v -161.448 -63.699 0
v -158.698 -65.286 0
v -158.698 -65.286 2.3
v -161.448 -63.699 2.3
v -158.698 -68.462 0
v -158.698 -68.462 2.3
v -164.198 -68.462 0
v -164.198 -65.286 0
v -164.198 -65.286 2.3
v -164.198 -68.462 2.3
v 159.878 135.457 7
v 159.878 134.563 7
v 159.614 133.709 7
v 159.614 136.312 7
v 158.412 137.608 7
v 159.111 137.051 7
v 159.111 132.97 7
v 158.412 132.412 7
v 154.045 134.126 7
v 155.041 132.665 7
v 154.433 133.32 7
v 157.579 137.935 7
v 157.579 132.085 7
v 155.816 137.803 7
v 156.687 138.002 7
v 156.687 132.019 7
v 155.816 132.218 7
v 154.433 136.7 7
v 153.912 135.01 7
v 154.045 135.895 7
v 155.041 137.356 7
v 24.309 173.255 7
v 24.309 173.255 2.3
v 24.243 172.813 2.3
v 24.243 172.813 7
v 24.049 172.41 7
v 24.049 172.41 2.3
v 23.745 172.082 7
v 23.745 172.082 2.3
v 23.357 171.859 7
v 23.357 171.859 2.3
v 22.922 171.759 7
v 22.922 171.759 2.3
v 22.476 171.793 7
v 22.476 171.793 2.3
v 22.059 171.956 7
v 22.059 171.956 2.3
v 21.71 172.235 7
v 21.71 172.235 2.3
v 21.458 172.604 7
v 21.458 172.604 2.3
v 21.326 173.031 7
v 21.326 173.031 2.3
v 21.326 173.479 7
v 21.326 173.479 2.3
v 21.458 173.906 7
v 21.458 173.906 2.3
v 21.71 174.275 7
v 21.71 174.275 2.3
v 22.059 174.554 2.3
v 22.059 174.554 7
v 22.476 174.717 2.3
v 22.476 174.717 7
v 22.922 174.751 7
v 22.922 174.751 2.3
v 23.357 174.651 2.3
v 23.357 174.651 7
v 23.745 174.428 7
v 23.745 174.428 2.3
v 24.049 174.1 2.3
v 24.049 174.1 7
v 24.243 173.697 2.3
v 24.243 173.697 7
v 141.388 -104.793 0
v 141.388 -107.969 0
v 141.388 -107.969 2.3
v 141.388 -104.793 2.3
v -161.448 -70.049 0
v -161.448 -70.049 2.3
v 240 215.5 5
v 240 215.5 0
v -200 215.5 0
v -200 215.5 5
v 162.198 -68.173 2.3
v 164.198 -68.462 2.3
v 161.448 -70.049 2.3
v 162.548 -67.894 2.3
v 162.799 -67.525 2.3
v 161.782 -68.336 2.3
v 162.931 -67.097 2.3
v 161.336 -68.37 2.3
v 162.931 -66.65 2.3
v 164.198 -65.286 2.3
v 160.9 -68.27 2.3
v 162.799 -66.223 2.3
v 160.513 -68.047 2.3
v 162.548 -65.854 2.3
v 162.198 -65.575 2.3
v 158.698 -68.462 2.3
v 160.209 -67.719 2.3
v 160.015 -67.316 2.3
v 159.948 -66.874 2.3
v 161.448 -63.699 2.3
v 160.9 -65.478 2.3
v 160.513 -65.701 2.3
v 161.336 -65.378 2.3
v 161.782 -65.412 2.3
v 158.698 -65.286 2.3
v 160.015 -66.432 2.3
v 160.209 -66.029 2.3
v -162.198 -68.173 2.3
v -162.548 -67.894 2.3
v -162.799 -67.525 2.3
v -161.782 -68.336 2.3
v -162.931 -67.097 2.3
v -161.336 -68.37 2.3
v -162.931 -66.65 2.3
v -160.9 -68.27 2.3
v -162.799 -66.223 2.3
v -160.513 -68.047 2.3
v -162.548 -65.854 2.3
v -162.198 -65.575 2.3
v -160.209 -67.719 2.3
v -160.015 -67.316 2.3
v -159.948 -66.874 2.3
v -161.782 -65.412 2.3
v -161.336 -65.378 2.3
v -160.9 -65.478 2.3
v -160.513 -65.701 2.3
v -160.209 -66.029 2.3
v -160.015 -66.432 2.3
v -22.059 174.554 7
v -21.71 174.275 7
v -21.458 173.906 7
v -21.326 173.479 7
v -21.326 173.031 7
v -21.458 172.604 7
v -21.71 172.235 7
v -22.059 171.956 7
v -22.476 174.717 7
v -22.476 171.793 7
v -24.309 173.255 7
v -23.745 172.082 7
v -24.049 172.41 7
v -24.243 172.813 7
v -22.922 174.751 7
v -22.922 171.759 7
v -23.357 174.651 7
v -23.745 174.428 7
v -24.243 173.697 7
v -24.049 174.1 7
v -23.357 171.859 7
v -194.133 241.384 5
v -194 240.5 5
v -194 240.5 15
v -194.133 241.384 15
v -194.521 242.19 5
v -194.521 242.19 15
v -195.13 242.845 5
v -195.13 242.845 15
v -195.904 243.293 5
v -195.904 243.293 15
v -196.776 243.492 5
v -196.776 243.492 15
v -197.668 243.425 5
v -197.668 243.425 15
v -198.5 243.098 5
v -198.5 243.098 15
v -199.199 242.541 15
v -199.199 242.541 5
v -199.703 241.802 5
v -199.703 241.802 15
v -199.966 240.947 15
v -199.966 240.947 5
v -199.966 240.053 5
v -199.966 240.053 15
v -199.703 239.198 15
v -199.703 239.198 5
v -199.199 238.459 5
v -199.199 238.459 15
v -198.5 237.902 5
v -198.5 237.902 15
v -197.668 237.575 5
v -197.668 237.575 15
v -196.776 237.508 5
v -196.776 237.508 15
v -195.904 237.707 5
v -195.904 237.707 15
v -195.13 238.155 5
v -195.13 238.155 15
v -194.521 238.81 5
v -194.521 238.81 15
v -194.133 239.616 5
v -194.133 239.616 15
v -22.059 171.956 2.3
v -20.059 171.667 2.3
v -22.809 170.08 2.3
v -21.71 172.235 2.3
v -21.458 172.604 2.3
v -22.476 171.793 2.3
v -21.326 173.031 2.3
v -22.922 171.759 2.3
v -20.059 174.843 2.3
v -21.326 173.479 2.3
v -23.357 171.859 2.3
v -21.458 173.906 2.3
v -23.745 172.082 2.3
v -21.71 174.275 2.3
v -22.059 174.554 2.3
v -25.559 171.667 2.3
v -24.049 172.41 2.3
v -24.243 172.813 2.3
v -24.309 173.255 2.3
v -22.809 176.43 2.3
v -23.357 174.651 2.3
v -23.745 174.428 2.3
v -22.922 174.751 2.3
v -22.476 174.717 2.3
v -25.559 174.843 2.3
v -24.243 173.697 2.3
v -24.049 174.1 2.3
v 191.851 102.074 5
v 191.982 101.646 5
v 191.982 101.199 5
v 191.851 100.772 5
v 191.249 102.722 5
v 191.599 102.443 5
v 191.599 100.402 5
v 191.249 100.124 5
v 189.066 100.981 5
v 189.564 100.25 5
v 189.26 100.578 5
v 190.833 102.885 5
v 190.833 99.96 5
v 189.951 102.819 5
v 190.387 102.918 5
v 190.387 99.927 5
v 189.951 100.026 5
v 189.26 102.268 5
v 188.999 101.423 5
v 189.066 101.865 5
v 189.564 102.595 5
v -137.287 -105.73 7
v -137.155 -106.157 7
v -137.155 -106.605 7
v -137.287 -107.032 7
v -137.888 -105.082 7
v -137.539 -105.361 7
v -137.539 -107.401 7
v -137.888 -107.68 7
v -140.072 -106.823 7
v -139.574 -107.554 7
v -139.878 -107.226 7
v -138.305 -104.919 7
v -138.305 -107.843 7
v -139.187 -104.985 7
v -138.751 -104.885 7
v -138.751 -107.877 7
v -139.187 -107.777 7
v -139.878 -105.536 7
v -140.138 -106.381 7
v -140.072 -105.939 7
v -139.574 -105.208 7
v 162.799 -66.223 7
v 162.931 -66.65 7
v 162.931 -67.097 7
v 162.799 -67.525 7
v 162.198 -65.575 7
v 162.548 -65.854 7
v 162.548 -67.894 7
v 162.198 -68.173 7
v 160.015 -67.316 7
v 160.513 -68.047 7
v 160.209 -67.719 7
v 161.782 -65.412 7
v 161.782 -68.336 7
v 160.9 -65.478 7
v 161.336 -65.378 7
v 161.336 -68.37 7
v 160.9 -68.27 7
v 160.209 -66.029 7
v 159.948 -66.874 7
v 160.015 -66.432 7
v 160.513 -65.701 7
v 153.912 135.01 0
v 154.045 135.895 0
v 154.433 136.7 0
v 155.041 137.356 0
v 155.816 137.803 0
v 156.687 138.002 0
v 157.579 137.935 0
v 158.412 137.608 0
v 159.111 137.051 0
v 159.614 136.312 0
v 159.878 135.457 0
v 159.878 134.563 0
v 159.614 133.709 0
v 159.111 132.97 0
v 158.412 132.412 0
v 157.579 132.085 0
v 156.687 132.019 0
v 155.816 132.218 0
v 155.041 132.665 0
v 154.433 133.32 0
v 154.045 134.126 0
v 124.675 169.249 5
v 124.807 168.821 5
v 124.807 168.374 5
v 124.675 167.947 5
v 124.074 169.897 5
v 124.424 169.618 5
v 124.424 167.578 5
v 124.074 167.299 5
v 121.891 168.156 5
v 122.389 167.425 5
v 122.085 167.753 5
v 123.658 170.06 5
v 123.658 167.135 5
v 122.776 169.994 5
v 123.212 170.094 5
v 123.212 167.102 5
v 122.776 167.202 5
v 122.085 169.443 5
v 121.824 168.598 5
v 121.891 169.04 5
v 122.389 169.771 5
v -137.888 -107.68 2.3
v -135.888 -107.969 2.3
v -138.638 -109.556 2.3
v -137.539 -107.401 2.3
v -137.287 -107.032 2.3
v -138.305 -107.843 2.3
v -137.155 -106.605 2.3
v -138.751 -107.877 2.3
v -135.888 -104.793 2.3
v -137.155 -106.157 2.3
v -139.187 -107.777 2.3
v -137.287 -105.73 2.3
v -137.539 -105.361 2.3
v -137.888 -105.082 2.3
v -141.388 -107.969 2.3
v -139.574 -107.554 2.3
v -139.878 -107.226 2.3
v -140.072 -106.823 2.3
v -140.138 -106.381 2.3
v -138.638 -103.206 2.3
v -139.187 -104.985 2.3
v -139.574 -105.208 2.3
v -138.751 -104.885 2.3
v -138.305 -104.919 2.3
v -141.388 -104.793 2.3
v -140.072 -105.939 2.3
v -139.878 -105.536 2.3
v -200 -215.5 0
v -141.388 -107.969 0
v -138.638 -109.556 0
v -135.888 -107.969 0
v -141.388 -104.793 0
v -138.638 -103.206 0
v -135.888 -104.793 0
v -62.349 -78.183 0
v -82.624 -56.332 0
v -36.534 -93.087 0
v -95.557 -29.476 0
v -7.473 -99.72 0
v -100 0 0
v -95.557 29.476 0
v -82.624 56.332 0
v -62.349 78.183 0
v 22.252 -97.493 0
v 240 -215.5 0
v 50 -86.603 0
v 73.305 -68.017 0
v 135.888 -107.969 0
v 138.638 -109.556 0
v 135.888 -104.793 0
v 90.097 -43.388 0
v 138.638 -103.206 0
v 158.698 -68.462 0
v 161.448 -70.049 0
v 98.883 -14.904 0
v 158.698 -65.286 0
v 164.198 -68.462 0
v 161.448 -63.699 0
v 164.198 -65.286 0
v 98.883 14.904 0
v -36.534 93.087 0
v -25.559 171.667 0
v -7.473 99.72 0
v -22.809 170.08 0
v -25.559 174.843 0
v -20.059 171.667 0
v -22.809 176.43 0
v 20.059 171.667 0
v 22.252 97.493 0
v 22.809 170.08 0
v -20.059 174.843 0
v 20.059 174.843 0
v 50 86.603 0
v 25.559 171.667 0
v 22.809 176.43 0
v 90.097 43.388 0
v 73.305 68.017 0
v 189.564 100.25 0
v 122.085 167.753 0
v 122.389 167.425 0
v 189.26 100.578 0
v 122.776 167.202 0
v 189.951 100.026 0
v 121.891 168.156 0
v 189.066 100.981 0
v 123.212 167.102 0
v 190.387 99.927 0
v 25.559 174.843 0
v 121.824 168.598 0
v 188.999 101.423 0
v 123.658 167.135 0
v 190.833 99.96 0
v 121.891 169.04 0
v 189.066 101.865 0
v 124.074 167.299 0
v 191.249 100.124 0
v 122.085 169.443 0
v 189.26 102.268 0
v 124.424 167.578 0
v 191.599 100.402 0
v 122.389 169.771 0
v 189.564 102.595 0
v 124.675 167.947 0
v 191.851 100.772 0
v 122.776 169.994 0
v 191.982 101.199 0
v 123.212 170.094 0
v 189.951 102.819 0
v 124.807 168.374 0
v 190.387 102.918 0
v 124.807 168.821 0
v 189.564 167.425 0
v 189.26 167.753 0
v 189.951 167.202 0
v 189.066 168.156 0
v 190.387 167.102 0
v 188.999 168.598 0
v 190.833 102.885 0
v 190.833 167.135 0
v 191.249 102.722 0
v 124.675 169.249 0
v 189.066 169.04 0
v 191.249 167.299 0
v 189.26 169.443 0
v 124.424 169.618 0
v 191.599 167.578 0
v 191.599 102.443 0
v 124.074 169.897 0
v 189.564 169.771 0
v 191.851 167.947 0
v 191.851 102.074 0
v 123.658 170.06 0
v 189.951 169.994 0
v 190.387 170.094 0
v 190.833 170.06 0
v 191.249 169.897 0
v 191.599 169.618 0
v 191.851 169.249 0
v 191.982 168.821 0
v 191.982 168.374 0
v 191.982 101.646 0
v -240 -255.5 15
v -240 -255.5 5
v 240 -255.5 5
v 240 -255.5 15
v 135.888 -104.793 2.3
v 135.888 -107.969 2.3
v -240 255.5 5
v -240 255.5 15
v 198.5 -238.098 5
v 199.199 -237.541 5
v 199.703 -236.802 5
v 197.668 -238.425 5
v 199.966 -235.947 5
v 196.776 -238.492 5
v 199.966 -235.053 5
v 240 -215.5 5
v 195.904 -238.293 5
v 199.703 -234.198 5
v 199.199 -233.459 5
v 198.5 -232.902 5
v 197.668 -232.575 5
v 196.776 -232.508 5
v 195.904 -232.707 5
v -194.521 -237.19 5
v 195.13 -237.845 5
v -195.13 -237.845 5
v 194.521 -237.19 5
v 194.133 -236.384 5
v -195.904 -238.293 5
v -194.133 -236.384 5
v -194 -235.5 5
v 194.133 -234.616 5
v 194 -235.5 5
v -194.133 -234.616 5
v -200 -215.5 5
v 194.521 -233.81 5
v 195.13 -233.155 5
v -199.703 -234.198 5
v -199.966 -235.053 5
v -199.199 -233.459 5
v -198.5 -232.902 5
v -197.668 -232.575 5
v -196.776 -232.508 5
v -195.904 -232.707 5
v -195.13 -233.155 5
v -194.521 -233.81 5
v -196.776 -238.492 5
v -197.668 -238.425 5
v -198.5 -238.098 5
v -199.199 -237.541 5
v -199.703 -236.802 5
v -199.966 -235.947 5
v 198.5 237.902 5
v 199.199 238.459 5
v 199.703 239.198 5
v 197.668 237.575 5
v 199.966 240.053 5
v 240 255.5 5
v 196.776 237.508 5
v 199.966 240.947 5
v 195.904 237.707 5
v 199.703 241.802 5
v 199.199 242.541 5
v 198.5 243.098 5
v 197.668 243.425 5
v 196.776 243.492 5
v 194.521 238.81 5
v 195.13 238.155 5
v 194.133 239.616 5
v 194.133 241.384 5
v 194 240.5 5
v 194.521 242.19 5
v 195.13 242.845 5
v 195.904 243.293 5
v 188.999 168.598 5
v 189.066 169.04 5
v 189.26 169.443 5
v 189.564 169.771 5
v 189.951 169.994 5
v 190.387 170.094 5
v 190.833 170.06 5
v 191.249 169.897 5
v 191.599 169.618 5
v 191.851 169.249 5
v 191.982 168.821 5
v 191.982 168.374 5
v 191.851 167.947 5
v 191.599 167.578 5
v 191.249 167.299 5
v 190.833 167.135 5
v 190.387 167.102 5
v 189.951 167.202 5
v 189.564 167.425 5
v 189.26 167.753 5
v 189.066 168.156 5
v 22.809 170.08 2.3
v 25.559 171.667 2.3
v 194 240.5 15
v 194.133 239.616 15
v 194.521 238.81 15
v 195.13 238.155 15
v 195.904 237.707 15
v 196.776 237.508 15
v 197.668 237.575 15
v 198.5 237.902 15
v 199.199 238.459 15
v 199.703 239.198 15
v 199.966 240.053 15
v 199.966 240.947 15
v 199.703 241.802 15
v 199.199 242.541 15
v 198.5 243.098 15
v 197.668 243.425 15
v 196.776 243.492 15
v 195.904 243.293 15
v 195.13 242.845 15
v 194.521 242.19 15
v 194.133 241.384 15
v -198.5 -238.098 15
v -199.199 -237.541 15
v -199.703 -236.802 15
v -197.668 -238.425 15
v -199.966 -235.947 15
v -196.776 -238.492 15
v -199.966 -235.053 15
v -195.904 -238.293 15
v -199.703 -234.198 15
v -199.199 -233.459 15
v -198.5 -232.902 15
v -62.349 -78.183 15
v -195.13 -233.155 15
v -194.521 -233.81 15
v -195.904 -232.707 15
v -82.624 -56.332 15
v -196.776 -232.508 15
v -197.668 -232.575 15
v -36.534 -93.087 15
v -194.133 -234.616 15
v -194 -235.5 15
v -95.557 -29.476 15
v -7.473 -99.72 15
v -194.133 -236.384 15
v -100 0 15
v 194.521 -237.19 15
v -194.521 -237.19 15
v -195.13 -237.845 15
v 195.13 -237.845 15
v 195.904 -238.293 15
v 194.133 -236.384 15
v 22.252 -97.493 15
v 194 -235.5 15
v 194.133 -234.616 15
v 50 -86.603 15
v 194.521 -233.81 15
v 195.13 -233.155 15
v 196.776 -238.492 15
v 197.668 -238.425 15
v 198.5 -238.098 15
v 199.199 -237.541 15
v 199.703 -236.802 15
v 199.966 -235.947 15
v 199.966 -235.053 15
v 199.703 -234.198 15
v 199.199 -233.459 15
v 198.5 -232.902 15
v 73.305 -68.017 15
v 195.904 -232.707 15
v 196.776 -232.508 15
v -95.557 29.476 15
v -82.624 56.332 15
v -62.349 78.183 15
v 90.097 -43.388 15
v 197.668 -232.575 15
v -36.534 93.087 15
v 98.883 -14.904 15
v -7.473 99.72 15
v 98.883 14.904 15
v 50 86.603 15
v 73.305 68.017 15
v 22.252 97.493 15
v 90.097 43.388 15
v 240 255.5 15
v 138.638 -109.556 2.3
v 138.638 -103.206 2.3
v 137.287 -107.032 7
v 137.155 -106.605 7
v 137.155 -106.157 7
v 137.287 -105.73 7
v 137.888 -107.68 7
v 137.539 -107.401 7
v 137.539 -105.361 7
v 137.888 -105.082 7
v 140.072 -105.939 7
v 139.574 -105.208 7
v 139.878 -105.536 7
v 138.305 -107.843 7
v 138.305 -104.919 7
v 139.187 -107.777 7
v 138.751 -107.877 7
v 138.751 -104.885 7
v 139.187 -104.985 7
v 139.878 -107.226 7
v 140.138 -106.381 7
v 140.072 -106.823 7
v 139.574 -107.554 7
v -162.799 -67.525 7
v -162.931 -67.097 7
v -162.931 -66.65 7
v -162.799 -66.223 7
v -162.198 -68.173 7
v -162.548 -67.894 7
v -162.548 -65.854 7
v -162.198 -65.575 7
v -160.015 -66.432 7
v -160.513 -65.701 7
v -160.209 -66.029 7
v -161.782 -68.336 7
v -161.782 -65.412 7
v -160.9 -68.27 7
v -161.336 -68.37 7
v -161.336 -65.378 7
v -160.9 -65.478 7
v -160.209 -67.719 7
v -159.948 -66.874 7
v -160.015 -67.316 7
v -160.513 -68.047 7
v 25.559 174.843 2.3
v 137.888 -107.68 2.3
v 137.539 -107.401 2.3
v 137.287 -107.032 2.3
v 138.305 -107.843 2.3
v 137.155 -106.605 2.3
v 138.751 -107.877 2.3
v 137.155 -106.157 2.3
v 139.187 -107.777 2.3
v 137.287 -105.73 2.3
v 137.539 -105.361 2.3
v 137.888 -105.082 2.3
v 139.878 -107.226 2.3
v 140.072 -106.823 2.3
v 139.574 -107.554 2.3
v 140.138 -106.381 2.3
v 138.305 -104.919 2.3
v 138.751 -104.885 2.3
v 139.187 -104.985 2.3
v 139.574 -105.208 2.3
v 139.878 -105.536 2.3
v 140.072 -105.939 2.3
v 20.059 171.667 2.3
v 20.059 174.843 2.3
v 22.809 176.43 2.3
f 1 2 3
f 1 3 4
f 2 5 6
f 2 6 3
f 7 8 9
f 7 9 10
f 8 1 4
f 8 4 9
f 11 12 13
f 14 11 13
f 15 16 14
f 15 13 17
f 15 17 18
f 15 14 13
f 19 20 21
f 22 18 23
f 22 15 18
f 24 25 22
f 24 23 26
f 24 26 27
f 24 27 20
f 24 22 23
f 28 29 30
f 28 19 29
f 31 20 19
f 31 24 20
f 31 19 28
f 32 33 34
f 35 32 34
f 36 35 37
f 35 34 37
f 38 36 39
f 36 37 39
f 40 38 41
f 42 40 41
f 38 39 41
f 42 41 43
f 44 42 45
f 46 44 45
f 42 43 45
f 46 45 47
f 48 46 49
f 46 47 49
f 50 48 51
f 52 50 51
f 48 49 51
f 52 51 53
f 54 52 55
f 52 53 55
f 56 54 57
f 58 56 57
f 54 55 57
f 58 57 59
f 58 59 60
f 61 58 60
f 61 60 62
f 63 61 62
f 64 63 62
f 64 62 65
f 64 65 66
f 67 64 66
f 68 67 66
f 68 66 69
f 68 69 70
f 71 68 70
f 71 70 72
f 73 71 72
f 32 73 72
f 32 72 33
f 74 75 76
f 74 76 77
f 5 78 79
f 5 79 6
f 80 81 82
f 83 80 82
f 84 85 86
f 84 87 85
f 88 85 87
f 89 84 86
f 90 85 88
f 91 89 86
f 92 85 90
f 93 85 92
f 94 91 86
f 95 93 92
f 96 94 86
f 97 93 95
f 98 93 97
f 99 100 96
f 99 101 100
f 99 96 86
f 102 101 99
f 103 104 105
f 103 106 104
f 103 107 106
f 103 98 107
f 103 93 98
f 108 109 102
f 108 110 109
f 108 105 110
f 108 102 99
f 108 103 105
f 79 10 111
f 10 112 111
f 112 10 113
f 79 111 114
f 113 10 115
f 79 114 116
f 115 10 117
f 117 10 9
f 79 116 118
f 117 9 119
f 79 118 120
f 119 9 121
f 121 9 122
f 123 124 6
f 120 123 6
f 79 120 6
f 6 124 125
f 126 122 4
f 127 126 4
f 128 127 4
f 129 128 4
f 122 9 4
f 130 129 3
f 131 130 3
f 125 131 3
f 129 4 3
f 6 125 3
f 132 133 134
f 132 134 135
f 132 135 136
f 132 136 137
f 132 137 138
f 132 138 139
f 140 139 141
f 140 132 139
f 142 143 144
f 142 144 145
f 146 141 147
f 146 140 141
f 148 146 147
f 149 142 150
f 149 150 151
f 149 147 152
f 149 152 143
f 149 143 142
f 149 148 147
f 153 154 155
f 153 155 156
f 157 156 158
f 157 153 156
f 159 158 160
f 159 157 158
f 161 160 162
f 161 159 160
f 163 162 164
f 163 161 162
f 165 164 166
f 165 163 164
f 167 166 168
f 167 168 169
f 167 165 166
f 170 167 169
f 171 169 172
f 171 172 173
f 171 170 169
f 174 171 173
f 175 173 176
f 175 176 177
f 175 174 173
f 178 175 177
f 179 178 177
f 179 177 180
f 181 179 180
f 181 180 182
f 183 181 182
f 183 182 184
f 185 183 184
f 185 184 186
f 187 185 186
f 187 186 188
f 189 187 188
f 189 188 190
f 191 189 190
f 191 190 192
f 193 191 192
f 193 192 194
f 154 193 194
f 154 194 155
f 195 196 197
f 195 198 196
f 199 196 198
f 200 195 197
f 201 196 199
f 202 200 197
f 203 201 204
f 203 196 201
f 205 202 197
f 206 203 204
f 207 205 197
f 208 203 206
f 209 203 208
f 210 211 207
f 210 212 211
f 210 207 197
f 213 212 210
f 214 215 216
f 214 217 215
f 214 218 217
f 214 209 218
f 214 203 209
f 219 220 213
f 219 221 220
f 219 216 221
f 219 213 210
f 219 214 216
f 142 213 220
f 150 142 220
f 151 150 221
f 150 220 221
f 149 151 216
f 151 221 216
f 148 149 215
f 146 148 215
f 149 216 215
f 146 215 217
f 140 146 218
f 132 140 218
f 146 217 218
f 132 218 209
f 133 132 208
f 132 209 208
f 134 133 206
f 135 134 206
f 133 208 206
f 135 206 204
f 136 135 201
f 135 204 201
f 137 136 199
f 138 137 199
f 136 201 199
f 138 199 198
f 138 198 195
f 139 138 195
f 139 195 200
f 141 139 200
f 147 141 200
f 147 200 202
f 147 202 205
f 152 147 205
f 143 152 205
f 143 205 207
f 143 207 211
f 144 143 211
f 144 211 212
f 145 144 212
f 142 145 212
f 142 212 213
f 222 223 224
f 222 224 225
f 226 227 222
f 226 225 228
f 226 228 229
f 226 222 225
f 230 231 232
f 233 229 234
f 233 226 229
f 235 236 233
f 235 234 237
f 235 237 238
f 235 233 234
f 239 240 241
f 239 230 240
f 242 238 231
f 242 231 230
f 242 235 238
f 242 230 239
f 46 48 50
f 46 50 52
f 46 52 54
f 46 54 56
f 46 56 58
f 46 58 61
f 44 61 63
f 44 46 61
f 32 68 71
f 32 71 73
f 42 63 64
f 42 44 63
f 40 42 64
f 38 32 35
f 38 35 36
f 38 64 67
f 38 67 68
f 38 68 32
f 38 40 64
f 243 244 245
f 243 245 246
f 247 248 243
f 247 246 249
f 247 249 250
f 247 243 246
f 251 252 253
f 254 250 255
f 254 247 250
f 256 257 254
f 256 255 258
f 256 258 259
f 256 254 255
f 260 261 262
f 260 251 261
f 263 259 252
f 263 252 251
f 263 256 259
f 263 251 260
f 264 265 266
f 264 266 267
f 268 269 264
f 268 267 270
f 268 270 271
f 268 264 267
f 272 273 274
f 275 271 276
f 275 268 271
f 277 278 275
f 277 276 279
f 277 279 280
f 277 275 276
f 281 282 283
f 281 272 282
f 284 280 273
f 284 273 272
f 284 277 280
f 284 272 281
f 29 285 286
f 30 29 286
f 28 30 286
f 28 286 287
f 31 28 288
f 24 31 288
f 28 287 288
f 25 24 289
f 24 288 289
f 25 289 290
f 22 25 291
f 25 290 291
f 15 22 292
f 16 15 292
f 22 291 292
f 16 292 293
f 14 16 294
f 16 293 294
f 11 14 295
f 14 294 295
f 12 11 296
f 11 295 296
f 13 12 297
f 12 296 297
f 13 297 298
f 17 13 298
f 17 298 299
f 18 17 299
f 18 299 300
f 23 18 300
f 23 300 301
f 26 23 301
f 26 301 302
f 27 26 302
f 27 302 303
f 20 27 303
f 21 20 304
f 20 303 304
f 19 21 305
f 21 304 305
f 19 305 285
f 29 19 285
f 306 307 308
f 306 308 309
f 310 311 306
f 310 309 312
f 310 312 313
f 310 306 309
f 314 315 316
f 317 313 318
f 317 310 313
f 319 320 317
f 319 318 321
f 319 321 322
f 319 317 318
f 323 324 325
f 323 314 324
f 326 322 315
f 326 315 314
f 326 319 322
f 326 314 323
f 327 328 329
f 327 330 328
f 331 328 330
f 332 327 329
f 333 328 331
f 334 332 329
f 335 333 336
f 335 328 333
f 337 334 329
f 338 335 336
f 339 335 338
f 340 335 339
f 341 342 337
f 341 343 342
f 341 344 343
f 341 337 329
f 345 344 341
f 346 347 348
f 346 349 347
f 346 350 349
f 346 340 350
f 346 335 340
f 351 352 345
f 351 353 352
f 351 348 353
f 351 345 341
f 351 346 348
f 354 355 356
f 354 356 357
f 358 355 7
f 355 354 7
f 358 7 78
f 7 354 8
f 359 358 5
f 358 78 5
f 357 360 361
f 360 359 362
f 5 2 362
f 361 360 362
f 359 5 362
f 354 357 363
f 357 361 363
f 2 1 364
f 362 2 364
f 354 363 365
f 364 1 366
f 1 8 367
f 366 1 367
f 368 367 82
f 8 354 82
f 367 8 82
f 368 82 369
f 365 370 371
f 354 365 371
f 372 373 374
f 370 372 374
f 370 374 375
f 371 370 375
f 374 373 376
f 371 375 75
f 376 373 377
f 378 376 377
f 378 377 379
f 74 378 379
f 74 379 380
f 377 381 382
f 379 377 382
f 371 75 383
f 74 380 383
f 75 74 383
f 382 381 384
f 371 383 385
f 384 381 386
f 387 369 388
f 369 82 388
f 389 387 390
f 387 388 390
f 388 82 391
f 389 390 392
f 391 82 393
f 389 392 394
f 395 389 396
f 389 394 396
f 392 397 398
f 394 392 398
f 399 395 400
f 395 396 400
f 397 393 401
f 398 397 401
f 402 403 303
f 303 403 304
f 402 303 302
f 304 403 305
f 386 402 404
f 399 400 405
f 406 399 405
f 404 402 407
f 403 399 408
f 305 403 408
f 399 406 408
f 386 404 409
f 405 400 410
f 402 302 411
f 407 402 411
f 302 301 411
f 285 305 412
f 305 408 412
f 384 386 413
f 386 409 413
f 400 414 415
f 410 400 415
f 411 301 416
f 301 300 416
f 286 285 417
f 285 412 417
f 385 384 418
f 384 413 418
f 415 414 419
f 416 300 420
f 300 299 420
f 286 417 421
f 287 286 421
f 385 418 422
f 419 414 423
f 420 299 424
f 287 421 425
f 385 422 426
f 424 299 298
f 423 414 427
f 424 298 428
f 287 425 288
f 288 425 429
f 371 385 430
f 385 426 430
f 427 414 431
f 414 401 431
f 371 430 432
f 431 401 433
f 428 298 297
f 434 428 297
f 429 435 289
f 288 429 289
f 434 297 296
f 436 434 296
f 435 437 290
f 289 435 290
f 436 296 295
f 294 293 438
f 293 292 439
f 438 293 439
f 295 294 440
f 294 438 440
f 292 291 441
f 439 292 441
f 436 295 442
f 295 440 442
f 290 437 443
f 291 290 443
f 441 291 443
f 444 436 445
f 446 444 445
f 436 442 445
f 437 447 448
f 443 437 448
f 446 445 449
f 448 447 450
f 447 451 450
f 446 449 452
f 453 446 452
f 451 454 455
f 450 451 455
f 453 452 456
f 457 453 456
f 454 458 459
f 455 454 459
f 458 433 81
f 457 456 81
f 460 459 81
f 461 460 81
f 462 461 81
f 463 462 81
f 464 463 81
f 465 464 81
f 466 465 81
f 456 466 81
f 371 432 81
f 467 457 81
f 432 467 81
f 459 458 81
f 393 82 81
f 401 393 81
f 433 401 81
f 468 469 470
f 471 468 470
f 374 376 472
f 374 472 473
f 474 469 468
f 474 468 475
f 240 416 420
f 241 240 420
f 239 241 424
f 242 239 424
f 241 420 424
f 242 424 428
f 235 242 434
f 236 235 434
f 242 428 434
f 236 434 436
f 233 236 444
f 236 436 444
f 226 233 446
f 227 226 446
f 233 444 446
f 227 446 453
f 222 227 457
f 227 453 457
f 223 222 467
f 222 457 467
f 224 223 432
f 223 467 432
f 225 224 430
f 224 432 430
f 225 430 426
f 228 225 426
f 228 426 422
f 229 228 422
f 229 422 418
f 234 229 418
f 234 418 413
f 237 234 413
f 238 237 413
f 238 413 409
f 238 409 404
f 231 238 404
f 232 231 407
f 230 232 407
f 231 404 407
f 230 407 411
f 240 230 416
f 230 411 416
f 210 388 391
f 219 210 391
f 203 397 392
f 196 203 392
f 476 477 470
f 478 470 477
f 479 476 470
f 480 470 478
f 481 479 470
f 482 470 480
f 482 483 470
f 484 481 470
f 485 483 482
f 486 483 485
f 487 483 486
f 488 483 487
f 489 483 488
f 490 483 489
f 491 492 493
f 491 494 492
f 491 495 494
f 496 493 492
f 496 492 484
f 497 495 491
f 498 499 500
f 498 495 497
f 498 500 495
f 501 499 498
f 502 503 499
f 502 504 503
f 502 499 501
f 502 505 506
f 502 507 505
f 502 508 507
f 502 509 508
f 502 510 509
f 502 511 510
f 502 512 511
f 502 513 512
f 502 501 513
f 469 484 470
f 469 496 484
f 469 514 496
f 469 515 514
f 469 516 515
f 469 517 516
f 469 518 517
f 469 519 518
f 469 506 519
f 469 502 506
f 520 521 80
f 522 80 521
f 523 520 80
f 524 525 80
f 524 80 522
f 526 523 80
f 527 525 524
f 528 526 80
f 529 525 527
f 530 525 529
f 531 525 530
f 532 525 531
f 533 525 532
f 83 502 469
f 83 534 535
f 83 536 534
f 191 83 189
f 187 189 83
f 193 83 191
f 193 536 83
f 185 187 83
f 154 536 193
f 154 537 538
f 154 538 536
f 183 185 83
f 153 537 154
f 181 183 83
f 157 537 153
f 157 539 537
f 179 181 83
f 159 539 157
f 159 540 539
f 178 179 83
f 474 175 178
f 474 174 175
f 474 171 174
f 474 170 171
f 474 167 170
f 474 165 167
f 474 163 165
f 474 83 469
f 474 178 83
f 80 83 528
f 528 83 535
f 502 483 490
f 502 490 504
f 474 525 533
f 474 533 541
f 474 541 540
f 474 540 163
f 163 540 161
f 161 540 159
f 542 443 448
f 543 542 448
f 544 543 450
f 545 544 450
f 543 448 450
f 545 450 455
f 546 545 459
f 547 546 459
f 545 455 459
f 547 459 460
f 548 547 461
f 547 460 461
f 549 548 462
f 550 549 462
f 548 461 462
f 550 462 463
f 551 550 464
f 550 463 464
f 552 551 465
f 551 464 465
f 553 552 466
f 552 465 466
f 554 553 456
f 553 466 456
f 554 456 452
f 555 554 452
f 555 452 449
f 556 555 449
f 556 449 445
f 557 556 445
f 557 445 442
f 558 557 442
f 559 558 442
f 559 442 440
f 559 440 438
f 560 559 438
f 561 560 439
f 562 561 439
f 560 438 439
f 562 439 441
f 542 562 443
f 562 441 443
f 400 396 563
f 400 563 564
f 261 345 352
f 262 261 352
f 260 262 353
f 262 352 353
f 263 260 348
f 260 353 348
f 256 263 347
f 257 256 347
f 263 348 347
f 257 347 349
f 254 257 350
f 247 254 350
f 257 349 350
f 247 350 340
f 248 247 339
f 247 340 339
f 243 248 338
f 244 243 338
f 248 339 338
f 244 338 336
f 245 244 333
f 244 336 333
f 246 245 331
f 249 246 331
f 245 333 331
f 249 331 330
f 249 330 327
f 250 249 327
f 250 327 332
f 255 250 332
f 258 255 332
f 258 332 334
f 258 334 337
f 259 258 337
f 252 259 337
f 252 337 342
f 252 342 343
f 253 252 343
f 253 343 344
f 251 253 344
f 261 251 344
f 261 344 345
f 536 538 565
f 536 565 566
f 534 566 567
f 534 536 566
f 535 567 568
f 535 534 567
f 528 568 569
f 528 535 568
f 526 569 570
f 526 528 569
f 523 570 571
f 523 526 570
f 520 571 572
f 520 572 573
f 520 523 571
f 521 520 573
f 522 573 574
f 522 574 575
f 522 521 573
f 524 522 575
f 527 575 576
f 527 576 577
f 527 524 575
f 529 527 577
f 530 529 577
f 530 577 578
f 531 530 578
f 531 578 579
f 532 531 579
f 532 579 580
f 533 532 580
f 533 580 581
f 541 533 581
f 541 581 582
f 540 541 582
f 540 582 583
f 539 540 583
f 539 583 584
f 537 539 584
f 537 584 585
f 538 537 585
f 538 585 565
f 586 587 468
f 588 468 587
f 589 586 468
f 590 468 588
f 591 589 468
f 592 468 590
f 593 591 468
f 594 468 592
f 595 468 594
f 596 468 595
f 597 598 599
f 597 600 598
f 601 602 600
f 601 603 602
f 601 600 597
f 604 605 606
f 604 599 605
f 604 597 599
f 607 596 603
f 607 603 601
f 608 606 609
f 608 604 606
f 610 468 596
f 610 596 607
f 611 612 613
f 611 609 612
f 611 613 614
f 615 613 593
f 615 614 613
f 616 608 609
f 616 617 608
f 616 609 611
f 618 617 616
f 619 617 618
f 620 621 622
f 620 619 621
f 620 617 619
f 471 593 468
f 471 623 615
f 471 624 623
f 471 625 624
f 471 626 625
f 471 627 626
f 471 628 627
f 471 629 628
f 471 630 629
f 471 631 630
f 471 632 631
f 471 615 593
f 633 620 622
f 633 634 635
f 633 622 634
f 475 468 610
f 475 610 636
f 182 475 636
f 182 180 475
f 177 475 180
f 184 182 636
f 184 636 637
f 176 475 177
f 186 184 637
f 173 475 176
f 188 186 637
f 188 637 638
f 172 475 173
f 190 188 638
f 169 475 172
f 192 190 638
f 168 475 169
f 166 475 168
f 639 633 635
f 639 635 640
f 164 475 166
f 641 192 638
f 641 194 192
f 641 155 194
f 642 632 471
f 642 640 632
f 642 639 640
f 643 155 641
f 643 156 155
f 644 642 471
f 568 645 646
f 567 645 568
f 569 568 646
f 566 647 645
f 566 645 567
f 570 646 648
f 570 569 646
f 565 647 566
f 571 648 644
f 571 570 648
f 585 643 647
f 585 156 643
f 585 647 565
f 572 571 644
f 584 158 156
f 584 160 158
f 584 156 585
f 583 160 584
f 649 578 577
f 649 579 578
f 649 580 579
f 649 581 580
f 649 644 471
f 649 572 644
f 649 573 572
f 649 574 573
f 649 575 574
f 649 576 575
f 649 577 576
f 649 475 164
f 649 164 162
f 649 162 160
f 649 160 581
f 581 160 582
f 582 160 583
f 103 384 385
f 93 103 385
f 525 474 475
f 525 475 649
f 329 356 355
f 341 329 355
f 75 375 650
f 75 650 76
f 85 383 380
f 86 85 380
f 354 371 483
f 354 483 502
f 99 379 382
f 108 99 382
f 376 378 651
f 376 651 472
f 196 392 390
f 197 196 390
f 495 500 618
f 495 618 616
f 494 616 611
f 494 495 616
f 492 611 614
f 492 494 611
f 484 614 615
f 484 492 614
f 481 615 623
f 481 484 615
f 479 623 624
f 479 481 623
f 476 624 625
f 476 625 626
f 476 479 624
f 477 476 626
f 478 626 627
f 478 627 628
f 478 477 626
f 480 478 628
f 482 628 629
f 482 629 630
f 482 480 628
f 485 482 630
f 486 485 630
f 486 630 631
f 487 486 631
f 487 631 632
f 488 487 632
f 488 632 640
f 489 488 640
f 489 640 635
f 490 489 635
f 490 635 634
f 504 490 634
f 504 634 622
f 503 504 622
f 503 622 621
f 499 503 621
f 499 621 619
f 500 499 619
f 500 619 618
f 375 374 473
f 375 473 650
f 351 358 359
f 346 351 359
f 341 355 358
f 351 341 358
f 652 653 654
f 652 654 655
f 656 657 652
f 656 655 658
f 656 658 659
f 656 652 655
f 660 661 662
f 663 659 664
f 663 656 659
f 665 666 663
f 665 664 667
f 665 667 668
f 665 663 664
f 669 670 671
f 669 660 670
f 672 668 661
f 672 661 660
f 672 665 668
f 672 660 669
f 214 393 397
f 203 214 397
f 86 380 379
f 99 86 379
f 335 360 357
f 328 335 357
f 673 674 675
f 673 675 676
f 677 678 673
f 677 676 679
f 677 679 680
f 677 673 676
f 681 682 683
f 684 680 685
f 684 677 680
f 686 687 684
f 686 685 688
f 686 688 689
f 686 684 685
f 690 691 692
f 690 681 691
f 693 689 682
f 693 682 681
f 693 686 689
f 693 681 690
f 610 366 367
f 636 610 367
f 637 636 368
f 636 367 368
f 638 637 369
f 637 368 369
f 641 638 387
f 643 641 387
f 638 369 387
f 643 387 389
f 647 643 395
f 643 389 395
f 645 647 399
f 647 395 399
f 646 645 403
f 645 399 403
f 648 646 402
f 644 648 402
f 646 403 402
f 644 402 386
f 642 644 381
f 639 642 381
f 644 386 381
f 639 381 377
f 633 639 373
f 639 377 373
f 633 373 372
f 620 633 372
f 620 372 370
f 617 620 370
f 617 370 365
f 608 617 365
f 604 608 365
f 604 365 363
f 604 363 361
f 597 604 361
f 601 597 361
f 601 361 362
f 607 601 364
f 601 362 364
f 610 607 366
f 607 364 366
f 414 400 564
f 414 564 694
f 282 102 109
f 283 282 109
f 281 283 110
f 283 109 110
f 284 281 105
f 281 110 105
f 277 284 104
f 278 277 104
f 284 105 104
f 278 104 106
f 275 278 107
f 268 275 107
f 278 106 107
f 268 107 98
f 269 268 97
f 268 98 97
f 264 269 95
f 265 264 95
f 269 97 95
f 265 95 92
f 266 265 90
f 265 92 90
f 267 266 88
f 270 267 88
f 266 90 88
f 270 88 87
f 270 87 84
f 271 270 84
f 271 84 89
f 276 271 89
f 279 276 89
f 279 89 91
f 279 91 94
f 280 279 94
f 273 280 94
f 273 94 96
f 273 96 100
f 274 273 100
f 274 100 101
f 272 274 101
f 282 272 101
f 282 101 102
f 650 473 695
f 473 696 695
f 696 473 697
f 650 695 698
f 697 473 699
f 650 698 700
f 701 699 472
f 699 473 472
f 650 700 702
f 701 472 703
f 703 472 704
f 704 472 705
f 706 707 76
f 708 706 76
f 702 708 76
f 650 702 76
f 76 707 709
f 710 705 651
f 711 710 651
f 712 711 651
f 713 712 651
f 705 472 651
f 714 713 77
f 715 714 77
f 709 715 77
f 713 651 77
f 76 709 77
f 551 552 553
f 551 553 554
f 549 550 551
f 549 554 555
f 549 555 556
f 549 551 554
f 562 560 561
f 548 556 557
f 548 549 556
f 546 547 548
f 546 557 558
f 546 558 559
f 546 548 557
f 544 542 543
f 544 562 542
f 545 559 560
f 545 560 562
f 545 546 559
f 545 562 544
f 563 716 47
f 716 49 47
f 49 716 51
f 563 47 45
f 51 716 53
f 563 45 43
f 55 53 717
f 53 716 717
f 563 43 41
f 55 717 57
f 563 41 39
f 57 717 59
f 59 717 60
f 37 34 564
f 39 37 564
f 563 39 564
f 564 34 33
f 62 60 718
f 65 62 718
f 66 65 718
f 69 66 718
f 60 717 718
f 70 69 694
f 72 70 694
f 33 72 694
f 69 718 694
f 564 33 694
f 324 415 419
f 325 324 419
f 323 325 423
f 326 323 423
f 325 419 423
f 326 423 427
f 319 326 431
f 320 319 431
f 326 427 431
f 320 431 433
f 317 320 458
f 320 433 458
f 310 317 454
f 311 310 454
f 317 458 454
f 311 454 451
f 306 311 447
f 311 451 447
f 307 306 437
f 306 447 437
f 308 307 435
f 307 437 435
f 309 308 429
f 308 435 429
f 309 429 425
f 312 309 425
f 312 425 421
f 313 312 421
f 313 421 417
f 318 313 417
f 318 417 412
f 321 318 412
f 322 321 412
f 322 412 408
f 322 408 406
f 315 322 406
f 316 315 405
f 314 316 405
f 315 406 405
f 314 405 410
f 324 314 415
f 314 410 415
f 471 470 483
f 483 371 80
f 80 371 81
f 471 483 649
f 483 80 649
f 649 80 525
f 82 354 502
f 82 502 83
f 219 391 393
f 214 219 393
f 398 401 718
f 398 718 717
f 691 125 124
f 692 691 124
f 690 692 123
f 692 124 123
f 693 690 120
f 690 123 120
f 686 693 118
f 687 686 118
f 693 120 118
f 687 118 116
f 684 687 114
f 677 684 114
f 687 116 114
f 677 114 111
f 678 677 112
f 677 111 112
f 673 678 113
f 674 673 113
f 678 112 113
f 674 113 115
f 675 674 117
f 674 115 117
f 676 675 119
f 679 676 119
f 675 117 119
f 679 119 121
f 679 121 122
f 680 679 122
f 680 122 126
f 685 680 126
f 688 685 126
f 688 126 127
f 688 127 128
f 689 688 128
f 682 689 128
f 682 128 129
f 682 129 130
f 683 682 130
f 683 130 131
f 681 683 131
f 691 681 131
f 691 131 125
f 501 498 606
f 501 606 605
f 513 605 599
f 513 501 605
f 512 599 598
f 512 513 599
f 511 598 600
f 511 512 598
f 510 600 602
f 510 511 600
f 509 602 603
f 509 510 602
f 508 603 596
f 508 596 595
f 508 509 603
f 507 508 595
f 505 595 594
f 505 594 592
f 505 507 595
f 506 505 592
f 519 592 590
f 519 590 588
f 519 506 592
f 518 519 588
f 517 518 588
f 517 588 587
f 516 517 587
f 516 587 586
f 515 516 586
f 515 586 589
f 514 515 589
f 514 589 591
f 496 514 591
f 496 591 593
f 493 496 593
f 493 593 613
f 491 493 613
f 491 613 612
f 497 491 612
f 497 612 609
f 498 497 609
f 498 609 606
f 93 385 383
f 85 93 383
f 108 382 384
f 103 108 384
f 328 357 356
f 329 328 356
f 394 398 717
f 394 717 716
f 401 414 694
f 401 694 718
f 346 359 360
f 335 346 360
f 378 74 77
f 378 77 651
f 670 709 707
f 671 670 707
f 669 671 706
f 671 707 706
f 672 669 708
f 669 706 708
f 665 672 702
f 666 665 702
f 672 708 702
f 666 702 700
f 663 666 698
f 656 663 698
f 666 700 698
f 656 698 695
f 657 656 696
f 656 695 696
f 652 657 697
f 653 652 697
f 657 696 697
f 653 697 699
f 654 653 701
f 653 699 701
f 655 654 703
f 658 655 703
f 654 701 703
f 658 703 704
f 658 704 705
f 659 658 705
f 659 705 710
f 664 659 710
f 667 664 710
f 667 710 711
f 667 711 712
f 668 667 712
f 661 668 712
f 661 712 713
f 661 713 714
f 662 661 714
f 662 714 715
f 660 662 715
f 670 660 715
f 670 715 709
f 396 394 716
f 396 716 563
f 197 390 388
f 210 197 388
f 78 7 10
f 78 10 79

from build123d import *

# Parameters (mm, degrees)
SKETCH1_W           = 480
SKETCH1_H           = 511
SKETCH1_R           = 3
BOSS_EXTRUDE1_DEPTH = 15
SKETCH2_W           = 40
SKETCH2_H           = 40
SKETCH2_H_2         = 431
SKETCH2_W_2         = 440
CUT_EXTRUDE1_DEPTH  = 5
SKETCH3_R           = 100
CUT_EXTRUDE2_DEPTH  = 15
SKETCH4_R           = 1.5
CUT_EXTRUDE3_DEPTH  = 7
CUT_EXTRUDE4_DEPTH  = 2.3
SKETCH6_R           = 3
CUT_EXTRUDE5_DEPTH  = 7
SKETCH7_R           = 1.5
CUT_EXTRUDE6_DEPTH  = 5


with BuildPart() as part:
    # Sketch1 → Boss-Extrude1 (new body)
    with BuildSketch(Plane.XY):
        Rectangle(SKETCH1_W, SKETCH1_H)
        with Locations((-197, 240.5)):
            Circle(SKETCH1_R, mode=Mode.SUBTRACT)
        with Locations((-197, -235.5)):
            Circle(SKETCH1_R, mode=Mode.SUBTRACT)
        with Locations(Location((197, -235.5, 0), (0, 0, 180))):
            Circle(SKETCH1_R, mode=Mode.SUBTRACT)
        with Locations(Location((197, 240.5, 0), (0, 0, 180))):
            Circle(SKETCH1_R, mode=Mode.SUBTRACT)
    extrude(amount=BOSS_EXTRUDE1_DEPTH)

    # Sketch2 → Cut-Extrude1 (cut)
    with BuildSketch(Plane(origin=(0, 0, 0), x_dir=(-1, 0, 0), z_dir=(0, 0, -1))):
        Polygon((-200, 255.5), (-240, 255.5), (-240, 215.5), (200, 215.5), (200, 255.5), align=None)
        with Locations((220, 235.5)):
            Rectangle(SKETCH2_W, SKETCH2_H)
        with Locations((220, 0)):
            Rectangle(SKETCH2_W, SKETCH2_H_2)
        with Locations((-20, -235.5)):
            Rectangle(SKETCH2_W_2, SKETCH2_H)
        with Locations((220, -235.5)):
            Rectangle(SKETCH2_W, SKETCH2_H)
    extrude(amount=-CUT_EXTRUDE1_DEPTH, mode=Mode.SUBTRACT)

    # Sketch3 → Cut-Extrude2 (cut)
    with BuildSketch(Plane(origin=(0, 0, 0), x_dir=(-1, 0, 0), z_dir=(0, 0, -1))):
        Circle(SKETCH3_R)
    extrude(amount=-CUT_EXTRUDE2_DEPTH, mode=Mode.SUBTRACT)

    # Sketch4 → Cut-Extrude3 (cut)
    with BuildSketch(Plane(origin=(0, 0, 0), x_dir=(-1, 0, 0), z_dir=(0, 0, -1))):
        with Locations((22.80945209, 173.254989525)):
            Circle(SKETCH4_R)
        with Locations(Location((-22.80945209, 173.254989525, 0), (0, 0, 180))):
            Circle(SKETCH4_R)
        with Locations((-161.447948306, -66.873929806)):
            Circle(SKETCH4_R)
        with Locations(Location((-138.638496216, -106.381059719, 0), (0, 0, 180))):
            Circle(SKETCH4_R)
        with Locations((138.638496216, -106.381059719)):
            Circle(SKETCH4_R)
        with Locations(Location((161.447948306, -66.873929806, 0), (0, 0, 180))):
            Circle(SKETCH4_R)
    extrude(amount=-CUT_EXTRUDE3_DEPTH, mode=Mode.SUBTRACT)

    # Sketch5 → Cut-Extrude4 (cut)
    with BuildSketch(Plane(origin=(0, 0, 0), x_dir=(-1, 0, 0), z_dir=(0, 0, -1))):
        Polygon((22.80945209, 176.430416006), (20.05945209, 174.842702765), (20.05945209, 171.667276285), (22.80945209, 170.079563045), (25.55945209, 171.667276285), (25.55945209, 174.842702765), align=None)
        Polygon((-20.05945209, 174.842702765), (-20.05945209, 171.667276285), (-22.80945209, 170.079563045), (-25.55945209, 171.667276285), (-25.55945209, 174.842702765), (-22.80945209, 176.430416006), align=None)
        Polygon((-164.197948306, -68.461643046), (-161.447948306, -70.049356286), (-158.697948306, -68.461643046), (-158.697948306, -65.286216566), (-161.447948306, -63.698503325), (-164.197948306, -65.286216566), align=None)
        Polygon((-138.638496216, -109.5564862), (-141.388496216, -107.96877296), (-141.388496216, -104.793346479), (-138.638496216, -103.205633239), (-135.888496216, -104.793346479), (-135.888496216, -107.96877296), align=None)
        Polygon((141.388496216, -107.96877296), (141.388496216, -104.793346479), (138.638496216, -103.205633239), (135.888496216, -104.793346479), (135.888496216, -107.96877296), (138.638496216, -109.5564862), align=None)
        Polygon((164.197948306, -65.286216566), (164.197948306, -68.461643046), (161.447948306, -70.049356286), (158.697948306, -68.461643046), (158.697948306, -65.286216566), (161.447948306, -63.698503325), align=None)
    extrude(amount=-CUT_EXTRUDE4_DEPTH, mode=Mode.SUBTRACT)

    # Sketch6 → Cut-Extrude5 (cut)
    with BuildSketch(Plane(origin=(0, 0, 0), x_dir=(-1, 0, 0), z_dir=(0, 0, -1))):
        with Locations((-156.911542489, 135.010250847)):
            Circle(SKETCH6_R)
    extrude(amount=-CUT_EXTRUDE5_DEPTH, mode=Mode.SUBTRACT)

    # Sketch7 → Cut-Extrude6 (cut)
    with BuildSketch(Plane(origin=(0, 0, 0), x_dir=(-1, 0, 0), z_dir=(0, 0, -1))):
        with Locations((-123.323970382, 168.597822953)):
            Circle(SKETCH7_R)
        with Locations((-190.499114595, 168.597822953)):
            Circle(SKETCH7_R)
        with Locations((-190.499114595, 101.422678741)):
            Circle(SKETCH7_R)
    extrude(amount=-CUT_EXTRUDE6_DEPTH, mode=Mode.SUBTRACT)


solid = part.part
